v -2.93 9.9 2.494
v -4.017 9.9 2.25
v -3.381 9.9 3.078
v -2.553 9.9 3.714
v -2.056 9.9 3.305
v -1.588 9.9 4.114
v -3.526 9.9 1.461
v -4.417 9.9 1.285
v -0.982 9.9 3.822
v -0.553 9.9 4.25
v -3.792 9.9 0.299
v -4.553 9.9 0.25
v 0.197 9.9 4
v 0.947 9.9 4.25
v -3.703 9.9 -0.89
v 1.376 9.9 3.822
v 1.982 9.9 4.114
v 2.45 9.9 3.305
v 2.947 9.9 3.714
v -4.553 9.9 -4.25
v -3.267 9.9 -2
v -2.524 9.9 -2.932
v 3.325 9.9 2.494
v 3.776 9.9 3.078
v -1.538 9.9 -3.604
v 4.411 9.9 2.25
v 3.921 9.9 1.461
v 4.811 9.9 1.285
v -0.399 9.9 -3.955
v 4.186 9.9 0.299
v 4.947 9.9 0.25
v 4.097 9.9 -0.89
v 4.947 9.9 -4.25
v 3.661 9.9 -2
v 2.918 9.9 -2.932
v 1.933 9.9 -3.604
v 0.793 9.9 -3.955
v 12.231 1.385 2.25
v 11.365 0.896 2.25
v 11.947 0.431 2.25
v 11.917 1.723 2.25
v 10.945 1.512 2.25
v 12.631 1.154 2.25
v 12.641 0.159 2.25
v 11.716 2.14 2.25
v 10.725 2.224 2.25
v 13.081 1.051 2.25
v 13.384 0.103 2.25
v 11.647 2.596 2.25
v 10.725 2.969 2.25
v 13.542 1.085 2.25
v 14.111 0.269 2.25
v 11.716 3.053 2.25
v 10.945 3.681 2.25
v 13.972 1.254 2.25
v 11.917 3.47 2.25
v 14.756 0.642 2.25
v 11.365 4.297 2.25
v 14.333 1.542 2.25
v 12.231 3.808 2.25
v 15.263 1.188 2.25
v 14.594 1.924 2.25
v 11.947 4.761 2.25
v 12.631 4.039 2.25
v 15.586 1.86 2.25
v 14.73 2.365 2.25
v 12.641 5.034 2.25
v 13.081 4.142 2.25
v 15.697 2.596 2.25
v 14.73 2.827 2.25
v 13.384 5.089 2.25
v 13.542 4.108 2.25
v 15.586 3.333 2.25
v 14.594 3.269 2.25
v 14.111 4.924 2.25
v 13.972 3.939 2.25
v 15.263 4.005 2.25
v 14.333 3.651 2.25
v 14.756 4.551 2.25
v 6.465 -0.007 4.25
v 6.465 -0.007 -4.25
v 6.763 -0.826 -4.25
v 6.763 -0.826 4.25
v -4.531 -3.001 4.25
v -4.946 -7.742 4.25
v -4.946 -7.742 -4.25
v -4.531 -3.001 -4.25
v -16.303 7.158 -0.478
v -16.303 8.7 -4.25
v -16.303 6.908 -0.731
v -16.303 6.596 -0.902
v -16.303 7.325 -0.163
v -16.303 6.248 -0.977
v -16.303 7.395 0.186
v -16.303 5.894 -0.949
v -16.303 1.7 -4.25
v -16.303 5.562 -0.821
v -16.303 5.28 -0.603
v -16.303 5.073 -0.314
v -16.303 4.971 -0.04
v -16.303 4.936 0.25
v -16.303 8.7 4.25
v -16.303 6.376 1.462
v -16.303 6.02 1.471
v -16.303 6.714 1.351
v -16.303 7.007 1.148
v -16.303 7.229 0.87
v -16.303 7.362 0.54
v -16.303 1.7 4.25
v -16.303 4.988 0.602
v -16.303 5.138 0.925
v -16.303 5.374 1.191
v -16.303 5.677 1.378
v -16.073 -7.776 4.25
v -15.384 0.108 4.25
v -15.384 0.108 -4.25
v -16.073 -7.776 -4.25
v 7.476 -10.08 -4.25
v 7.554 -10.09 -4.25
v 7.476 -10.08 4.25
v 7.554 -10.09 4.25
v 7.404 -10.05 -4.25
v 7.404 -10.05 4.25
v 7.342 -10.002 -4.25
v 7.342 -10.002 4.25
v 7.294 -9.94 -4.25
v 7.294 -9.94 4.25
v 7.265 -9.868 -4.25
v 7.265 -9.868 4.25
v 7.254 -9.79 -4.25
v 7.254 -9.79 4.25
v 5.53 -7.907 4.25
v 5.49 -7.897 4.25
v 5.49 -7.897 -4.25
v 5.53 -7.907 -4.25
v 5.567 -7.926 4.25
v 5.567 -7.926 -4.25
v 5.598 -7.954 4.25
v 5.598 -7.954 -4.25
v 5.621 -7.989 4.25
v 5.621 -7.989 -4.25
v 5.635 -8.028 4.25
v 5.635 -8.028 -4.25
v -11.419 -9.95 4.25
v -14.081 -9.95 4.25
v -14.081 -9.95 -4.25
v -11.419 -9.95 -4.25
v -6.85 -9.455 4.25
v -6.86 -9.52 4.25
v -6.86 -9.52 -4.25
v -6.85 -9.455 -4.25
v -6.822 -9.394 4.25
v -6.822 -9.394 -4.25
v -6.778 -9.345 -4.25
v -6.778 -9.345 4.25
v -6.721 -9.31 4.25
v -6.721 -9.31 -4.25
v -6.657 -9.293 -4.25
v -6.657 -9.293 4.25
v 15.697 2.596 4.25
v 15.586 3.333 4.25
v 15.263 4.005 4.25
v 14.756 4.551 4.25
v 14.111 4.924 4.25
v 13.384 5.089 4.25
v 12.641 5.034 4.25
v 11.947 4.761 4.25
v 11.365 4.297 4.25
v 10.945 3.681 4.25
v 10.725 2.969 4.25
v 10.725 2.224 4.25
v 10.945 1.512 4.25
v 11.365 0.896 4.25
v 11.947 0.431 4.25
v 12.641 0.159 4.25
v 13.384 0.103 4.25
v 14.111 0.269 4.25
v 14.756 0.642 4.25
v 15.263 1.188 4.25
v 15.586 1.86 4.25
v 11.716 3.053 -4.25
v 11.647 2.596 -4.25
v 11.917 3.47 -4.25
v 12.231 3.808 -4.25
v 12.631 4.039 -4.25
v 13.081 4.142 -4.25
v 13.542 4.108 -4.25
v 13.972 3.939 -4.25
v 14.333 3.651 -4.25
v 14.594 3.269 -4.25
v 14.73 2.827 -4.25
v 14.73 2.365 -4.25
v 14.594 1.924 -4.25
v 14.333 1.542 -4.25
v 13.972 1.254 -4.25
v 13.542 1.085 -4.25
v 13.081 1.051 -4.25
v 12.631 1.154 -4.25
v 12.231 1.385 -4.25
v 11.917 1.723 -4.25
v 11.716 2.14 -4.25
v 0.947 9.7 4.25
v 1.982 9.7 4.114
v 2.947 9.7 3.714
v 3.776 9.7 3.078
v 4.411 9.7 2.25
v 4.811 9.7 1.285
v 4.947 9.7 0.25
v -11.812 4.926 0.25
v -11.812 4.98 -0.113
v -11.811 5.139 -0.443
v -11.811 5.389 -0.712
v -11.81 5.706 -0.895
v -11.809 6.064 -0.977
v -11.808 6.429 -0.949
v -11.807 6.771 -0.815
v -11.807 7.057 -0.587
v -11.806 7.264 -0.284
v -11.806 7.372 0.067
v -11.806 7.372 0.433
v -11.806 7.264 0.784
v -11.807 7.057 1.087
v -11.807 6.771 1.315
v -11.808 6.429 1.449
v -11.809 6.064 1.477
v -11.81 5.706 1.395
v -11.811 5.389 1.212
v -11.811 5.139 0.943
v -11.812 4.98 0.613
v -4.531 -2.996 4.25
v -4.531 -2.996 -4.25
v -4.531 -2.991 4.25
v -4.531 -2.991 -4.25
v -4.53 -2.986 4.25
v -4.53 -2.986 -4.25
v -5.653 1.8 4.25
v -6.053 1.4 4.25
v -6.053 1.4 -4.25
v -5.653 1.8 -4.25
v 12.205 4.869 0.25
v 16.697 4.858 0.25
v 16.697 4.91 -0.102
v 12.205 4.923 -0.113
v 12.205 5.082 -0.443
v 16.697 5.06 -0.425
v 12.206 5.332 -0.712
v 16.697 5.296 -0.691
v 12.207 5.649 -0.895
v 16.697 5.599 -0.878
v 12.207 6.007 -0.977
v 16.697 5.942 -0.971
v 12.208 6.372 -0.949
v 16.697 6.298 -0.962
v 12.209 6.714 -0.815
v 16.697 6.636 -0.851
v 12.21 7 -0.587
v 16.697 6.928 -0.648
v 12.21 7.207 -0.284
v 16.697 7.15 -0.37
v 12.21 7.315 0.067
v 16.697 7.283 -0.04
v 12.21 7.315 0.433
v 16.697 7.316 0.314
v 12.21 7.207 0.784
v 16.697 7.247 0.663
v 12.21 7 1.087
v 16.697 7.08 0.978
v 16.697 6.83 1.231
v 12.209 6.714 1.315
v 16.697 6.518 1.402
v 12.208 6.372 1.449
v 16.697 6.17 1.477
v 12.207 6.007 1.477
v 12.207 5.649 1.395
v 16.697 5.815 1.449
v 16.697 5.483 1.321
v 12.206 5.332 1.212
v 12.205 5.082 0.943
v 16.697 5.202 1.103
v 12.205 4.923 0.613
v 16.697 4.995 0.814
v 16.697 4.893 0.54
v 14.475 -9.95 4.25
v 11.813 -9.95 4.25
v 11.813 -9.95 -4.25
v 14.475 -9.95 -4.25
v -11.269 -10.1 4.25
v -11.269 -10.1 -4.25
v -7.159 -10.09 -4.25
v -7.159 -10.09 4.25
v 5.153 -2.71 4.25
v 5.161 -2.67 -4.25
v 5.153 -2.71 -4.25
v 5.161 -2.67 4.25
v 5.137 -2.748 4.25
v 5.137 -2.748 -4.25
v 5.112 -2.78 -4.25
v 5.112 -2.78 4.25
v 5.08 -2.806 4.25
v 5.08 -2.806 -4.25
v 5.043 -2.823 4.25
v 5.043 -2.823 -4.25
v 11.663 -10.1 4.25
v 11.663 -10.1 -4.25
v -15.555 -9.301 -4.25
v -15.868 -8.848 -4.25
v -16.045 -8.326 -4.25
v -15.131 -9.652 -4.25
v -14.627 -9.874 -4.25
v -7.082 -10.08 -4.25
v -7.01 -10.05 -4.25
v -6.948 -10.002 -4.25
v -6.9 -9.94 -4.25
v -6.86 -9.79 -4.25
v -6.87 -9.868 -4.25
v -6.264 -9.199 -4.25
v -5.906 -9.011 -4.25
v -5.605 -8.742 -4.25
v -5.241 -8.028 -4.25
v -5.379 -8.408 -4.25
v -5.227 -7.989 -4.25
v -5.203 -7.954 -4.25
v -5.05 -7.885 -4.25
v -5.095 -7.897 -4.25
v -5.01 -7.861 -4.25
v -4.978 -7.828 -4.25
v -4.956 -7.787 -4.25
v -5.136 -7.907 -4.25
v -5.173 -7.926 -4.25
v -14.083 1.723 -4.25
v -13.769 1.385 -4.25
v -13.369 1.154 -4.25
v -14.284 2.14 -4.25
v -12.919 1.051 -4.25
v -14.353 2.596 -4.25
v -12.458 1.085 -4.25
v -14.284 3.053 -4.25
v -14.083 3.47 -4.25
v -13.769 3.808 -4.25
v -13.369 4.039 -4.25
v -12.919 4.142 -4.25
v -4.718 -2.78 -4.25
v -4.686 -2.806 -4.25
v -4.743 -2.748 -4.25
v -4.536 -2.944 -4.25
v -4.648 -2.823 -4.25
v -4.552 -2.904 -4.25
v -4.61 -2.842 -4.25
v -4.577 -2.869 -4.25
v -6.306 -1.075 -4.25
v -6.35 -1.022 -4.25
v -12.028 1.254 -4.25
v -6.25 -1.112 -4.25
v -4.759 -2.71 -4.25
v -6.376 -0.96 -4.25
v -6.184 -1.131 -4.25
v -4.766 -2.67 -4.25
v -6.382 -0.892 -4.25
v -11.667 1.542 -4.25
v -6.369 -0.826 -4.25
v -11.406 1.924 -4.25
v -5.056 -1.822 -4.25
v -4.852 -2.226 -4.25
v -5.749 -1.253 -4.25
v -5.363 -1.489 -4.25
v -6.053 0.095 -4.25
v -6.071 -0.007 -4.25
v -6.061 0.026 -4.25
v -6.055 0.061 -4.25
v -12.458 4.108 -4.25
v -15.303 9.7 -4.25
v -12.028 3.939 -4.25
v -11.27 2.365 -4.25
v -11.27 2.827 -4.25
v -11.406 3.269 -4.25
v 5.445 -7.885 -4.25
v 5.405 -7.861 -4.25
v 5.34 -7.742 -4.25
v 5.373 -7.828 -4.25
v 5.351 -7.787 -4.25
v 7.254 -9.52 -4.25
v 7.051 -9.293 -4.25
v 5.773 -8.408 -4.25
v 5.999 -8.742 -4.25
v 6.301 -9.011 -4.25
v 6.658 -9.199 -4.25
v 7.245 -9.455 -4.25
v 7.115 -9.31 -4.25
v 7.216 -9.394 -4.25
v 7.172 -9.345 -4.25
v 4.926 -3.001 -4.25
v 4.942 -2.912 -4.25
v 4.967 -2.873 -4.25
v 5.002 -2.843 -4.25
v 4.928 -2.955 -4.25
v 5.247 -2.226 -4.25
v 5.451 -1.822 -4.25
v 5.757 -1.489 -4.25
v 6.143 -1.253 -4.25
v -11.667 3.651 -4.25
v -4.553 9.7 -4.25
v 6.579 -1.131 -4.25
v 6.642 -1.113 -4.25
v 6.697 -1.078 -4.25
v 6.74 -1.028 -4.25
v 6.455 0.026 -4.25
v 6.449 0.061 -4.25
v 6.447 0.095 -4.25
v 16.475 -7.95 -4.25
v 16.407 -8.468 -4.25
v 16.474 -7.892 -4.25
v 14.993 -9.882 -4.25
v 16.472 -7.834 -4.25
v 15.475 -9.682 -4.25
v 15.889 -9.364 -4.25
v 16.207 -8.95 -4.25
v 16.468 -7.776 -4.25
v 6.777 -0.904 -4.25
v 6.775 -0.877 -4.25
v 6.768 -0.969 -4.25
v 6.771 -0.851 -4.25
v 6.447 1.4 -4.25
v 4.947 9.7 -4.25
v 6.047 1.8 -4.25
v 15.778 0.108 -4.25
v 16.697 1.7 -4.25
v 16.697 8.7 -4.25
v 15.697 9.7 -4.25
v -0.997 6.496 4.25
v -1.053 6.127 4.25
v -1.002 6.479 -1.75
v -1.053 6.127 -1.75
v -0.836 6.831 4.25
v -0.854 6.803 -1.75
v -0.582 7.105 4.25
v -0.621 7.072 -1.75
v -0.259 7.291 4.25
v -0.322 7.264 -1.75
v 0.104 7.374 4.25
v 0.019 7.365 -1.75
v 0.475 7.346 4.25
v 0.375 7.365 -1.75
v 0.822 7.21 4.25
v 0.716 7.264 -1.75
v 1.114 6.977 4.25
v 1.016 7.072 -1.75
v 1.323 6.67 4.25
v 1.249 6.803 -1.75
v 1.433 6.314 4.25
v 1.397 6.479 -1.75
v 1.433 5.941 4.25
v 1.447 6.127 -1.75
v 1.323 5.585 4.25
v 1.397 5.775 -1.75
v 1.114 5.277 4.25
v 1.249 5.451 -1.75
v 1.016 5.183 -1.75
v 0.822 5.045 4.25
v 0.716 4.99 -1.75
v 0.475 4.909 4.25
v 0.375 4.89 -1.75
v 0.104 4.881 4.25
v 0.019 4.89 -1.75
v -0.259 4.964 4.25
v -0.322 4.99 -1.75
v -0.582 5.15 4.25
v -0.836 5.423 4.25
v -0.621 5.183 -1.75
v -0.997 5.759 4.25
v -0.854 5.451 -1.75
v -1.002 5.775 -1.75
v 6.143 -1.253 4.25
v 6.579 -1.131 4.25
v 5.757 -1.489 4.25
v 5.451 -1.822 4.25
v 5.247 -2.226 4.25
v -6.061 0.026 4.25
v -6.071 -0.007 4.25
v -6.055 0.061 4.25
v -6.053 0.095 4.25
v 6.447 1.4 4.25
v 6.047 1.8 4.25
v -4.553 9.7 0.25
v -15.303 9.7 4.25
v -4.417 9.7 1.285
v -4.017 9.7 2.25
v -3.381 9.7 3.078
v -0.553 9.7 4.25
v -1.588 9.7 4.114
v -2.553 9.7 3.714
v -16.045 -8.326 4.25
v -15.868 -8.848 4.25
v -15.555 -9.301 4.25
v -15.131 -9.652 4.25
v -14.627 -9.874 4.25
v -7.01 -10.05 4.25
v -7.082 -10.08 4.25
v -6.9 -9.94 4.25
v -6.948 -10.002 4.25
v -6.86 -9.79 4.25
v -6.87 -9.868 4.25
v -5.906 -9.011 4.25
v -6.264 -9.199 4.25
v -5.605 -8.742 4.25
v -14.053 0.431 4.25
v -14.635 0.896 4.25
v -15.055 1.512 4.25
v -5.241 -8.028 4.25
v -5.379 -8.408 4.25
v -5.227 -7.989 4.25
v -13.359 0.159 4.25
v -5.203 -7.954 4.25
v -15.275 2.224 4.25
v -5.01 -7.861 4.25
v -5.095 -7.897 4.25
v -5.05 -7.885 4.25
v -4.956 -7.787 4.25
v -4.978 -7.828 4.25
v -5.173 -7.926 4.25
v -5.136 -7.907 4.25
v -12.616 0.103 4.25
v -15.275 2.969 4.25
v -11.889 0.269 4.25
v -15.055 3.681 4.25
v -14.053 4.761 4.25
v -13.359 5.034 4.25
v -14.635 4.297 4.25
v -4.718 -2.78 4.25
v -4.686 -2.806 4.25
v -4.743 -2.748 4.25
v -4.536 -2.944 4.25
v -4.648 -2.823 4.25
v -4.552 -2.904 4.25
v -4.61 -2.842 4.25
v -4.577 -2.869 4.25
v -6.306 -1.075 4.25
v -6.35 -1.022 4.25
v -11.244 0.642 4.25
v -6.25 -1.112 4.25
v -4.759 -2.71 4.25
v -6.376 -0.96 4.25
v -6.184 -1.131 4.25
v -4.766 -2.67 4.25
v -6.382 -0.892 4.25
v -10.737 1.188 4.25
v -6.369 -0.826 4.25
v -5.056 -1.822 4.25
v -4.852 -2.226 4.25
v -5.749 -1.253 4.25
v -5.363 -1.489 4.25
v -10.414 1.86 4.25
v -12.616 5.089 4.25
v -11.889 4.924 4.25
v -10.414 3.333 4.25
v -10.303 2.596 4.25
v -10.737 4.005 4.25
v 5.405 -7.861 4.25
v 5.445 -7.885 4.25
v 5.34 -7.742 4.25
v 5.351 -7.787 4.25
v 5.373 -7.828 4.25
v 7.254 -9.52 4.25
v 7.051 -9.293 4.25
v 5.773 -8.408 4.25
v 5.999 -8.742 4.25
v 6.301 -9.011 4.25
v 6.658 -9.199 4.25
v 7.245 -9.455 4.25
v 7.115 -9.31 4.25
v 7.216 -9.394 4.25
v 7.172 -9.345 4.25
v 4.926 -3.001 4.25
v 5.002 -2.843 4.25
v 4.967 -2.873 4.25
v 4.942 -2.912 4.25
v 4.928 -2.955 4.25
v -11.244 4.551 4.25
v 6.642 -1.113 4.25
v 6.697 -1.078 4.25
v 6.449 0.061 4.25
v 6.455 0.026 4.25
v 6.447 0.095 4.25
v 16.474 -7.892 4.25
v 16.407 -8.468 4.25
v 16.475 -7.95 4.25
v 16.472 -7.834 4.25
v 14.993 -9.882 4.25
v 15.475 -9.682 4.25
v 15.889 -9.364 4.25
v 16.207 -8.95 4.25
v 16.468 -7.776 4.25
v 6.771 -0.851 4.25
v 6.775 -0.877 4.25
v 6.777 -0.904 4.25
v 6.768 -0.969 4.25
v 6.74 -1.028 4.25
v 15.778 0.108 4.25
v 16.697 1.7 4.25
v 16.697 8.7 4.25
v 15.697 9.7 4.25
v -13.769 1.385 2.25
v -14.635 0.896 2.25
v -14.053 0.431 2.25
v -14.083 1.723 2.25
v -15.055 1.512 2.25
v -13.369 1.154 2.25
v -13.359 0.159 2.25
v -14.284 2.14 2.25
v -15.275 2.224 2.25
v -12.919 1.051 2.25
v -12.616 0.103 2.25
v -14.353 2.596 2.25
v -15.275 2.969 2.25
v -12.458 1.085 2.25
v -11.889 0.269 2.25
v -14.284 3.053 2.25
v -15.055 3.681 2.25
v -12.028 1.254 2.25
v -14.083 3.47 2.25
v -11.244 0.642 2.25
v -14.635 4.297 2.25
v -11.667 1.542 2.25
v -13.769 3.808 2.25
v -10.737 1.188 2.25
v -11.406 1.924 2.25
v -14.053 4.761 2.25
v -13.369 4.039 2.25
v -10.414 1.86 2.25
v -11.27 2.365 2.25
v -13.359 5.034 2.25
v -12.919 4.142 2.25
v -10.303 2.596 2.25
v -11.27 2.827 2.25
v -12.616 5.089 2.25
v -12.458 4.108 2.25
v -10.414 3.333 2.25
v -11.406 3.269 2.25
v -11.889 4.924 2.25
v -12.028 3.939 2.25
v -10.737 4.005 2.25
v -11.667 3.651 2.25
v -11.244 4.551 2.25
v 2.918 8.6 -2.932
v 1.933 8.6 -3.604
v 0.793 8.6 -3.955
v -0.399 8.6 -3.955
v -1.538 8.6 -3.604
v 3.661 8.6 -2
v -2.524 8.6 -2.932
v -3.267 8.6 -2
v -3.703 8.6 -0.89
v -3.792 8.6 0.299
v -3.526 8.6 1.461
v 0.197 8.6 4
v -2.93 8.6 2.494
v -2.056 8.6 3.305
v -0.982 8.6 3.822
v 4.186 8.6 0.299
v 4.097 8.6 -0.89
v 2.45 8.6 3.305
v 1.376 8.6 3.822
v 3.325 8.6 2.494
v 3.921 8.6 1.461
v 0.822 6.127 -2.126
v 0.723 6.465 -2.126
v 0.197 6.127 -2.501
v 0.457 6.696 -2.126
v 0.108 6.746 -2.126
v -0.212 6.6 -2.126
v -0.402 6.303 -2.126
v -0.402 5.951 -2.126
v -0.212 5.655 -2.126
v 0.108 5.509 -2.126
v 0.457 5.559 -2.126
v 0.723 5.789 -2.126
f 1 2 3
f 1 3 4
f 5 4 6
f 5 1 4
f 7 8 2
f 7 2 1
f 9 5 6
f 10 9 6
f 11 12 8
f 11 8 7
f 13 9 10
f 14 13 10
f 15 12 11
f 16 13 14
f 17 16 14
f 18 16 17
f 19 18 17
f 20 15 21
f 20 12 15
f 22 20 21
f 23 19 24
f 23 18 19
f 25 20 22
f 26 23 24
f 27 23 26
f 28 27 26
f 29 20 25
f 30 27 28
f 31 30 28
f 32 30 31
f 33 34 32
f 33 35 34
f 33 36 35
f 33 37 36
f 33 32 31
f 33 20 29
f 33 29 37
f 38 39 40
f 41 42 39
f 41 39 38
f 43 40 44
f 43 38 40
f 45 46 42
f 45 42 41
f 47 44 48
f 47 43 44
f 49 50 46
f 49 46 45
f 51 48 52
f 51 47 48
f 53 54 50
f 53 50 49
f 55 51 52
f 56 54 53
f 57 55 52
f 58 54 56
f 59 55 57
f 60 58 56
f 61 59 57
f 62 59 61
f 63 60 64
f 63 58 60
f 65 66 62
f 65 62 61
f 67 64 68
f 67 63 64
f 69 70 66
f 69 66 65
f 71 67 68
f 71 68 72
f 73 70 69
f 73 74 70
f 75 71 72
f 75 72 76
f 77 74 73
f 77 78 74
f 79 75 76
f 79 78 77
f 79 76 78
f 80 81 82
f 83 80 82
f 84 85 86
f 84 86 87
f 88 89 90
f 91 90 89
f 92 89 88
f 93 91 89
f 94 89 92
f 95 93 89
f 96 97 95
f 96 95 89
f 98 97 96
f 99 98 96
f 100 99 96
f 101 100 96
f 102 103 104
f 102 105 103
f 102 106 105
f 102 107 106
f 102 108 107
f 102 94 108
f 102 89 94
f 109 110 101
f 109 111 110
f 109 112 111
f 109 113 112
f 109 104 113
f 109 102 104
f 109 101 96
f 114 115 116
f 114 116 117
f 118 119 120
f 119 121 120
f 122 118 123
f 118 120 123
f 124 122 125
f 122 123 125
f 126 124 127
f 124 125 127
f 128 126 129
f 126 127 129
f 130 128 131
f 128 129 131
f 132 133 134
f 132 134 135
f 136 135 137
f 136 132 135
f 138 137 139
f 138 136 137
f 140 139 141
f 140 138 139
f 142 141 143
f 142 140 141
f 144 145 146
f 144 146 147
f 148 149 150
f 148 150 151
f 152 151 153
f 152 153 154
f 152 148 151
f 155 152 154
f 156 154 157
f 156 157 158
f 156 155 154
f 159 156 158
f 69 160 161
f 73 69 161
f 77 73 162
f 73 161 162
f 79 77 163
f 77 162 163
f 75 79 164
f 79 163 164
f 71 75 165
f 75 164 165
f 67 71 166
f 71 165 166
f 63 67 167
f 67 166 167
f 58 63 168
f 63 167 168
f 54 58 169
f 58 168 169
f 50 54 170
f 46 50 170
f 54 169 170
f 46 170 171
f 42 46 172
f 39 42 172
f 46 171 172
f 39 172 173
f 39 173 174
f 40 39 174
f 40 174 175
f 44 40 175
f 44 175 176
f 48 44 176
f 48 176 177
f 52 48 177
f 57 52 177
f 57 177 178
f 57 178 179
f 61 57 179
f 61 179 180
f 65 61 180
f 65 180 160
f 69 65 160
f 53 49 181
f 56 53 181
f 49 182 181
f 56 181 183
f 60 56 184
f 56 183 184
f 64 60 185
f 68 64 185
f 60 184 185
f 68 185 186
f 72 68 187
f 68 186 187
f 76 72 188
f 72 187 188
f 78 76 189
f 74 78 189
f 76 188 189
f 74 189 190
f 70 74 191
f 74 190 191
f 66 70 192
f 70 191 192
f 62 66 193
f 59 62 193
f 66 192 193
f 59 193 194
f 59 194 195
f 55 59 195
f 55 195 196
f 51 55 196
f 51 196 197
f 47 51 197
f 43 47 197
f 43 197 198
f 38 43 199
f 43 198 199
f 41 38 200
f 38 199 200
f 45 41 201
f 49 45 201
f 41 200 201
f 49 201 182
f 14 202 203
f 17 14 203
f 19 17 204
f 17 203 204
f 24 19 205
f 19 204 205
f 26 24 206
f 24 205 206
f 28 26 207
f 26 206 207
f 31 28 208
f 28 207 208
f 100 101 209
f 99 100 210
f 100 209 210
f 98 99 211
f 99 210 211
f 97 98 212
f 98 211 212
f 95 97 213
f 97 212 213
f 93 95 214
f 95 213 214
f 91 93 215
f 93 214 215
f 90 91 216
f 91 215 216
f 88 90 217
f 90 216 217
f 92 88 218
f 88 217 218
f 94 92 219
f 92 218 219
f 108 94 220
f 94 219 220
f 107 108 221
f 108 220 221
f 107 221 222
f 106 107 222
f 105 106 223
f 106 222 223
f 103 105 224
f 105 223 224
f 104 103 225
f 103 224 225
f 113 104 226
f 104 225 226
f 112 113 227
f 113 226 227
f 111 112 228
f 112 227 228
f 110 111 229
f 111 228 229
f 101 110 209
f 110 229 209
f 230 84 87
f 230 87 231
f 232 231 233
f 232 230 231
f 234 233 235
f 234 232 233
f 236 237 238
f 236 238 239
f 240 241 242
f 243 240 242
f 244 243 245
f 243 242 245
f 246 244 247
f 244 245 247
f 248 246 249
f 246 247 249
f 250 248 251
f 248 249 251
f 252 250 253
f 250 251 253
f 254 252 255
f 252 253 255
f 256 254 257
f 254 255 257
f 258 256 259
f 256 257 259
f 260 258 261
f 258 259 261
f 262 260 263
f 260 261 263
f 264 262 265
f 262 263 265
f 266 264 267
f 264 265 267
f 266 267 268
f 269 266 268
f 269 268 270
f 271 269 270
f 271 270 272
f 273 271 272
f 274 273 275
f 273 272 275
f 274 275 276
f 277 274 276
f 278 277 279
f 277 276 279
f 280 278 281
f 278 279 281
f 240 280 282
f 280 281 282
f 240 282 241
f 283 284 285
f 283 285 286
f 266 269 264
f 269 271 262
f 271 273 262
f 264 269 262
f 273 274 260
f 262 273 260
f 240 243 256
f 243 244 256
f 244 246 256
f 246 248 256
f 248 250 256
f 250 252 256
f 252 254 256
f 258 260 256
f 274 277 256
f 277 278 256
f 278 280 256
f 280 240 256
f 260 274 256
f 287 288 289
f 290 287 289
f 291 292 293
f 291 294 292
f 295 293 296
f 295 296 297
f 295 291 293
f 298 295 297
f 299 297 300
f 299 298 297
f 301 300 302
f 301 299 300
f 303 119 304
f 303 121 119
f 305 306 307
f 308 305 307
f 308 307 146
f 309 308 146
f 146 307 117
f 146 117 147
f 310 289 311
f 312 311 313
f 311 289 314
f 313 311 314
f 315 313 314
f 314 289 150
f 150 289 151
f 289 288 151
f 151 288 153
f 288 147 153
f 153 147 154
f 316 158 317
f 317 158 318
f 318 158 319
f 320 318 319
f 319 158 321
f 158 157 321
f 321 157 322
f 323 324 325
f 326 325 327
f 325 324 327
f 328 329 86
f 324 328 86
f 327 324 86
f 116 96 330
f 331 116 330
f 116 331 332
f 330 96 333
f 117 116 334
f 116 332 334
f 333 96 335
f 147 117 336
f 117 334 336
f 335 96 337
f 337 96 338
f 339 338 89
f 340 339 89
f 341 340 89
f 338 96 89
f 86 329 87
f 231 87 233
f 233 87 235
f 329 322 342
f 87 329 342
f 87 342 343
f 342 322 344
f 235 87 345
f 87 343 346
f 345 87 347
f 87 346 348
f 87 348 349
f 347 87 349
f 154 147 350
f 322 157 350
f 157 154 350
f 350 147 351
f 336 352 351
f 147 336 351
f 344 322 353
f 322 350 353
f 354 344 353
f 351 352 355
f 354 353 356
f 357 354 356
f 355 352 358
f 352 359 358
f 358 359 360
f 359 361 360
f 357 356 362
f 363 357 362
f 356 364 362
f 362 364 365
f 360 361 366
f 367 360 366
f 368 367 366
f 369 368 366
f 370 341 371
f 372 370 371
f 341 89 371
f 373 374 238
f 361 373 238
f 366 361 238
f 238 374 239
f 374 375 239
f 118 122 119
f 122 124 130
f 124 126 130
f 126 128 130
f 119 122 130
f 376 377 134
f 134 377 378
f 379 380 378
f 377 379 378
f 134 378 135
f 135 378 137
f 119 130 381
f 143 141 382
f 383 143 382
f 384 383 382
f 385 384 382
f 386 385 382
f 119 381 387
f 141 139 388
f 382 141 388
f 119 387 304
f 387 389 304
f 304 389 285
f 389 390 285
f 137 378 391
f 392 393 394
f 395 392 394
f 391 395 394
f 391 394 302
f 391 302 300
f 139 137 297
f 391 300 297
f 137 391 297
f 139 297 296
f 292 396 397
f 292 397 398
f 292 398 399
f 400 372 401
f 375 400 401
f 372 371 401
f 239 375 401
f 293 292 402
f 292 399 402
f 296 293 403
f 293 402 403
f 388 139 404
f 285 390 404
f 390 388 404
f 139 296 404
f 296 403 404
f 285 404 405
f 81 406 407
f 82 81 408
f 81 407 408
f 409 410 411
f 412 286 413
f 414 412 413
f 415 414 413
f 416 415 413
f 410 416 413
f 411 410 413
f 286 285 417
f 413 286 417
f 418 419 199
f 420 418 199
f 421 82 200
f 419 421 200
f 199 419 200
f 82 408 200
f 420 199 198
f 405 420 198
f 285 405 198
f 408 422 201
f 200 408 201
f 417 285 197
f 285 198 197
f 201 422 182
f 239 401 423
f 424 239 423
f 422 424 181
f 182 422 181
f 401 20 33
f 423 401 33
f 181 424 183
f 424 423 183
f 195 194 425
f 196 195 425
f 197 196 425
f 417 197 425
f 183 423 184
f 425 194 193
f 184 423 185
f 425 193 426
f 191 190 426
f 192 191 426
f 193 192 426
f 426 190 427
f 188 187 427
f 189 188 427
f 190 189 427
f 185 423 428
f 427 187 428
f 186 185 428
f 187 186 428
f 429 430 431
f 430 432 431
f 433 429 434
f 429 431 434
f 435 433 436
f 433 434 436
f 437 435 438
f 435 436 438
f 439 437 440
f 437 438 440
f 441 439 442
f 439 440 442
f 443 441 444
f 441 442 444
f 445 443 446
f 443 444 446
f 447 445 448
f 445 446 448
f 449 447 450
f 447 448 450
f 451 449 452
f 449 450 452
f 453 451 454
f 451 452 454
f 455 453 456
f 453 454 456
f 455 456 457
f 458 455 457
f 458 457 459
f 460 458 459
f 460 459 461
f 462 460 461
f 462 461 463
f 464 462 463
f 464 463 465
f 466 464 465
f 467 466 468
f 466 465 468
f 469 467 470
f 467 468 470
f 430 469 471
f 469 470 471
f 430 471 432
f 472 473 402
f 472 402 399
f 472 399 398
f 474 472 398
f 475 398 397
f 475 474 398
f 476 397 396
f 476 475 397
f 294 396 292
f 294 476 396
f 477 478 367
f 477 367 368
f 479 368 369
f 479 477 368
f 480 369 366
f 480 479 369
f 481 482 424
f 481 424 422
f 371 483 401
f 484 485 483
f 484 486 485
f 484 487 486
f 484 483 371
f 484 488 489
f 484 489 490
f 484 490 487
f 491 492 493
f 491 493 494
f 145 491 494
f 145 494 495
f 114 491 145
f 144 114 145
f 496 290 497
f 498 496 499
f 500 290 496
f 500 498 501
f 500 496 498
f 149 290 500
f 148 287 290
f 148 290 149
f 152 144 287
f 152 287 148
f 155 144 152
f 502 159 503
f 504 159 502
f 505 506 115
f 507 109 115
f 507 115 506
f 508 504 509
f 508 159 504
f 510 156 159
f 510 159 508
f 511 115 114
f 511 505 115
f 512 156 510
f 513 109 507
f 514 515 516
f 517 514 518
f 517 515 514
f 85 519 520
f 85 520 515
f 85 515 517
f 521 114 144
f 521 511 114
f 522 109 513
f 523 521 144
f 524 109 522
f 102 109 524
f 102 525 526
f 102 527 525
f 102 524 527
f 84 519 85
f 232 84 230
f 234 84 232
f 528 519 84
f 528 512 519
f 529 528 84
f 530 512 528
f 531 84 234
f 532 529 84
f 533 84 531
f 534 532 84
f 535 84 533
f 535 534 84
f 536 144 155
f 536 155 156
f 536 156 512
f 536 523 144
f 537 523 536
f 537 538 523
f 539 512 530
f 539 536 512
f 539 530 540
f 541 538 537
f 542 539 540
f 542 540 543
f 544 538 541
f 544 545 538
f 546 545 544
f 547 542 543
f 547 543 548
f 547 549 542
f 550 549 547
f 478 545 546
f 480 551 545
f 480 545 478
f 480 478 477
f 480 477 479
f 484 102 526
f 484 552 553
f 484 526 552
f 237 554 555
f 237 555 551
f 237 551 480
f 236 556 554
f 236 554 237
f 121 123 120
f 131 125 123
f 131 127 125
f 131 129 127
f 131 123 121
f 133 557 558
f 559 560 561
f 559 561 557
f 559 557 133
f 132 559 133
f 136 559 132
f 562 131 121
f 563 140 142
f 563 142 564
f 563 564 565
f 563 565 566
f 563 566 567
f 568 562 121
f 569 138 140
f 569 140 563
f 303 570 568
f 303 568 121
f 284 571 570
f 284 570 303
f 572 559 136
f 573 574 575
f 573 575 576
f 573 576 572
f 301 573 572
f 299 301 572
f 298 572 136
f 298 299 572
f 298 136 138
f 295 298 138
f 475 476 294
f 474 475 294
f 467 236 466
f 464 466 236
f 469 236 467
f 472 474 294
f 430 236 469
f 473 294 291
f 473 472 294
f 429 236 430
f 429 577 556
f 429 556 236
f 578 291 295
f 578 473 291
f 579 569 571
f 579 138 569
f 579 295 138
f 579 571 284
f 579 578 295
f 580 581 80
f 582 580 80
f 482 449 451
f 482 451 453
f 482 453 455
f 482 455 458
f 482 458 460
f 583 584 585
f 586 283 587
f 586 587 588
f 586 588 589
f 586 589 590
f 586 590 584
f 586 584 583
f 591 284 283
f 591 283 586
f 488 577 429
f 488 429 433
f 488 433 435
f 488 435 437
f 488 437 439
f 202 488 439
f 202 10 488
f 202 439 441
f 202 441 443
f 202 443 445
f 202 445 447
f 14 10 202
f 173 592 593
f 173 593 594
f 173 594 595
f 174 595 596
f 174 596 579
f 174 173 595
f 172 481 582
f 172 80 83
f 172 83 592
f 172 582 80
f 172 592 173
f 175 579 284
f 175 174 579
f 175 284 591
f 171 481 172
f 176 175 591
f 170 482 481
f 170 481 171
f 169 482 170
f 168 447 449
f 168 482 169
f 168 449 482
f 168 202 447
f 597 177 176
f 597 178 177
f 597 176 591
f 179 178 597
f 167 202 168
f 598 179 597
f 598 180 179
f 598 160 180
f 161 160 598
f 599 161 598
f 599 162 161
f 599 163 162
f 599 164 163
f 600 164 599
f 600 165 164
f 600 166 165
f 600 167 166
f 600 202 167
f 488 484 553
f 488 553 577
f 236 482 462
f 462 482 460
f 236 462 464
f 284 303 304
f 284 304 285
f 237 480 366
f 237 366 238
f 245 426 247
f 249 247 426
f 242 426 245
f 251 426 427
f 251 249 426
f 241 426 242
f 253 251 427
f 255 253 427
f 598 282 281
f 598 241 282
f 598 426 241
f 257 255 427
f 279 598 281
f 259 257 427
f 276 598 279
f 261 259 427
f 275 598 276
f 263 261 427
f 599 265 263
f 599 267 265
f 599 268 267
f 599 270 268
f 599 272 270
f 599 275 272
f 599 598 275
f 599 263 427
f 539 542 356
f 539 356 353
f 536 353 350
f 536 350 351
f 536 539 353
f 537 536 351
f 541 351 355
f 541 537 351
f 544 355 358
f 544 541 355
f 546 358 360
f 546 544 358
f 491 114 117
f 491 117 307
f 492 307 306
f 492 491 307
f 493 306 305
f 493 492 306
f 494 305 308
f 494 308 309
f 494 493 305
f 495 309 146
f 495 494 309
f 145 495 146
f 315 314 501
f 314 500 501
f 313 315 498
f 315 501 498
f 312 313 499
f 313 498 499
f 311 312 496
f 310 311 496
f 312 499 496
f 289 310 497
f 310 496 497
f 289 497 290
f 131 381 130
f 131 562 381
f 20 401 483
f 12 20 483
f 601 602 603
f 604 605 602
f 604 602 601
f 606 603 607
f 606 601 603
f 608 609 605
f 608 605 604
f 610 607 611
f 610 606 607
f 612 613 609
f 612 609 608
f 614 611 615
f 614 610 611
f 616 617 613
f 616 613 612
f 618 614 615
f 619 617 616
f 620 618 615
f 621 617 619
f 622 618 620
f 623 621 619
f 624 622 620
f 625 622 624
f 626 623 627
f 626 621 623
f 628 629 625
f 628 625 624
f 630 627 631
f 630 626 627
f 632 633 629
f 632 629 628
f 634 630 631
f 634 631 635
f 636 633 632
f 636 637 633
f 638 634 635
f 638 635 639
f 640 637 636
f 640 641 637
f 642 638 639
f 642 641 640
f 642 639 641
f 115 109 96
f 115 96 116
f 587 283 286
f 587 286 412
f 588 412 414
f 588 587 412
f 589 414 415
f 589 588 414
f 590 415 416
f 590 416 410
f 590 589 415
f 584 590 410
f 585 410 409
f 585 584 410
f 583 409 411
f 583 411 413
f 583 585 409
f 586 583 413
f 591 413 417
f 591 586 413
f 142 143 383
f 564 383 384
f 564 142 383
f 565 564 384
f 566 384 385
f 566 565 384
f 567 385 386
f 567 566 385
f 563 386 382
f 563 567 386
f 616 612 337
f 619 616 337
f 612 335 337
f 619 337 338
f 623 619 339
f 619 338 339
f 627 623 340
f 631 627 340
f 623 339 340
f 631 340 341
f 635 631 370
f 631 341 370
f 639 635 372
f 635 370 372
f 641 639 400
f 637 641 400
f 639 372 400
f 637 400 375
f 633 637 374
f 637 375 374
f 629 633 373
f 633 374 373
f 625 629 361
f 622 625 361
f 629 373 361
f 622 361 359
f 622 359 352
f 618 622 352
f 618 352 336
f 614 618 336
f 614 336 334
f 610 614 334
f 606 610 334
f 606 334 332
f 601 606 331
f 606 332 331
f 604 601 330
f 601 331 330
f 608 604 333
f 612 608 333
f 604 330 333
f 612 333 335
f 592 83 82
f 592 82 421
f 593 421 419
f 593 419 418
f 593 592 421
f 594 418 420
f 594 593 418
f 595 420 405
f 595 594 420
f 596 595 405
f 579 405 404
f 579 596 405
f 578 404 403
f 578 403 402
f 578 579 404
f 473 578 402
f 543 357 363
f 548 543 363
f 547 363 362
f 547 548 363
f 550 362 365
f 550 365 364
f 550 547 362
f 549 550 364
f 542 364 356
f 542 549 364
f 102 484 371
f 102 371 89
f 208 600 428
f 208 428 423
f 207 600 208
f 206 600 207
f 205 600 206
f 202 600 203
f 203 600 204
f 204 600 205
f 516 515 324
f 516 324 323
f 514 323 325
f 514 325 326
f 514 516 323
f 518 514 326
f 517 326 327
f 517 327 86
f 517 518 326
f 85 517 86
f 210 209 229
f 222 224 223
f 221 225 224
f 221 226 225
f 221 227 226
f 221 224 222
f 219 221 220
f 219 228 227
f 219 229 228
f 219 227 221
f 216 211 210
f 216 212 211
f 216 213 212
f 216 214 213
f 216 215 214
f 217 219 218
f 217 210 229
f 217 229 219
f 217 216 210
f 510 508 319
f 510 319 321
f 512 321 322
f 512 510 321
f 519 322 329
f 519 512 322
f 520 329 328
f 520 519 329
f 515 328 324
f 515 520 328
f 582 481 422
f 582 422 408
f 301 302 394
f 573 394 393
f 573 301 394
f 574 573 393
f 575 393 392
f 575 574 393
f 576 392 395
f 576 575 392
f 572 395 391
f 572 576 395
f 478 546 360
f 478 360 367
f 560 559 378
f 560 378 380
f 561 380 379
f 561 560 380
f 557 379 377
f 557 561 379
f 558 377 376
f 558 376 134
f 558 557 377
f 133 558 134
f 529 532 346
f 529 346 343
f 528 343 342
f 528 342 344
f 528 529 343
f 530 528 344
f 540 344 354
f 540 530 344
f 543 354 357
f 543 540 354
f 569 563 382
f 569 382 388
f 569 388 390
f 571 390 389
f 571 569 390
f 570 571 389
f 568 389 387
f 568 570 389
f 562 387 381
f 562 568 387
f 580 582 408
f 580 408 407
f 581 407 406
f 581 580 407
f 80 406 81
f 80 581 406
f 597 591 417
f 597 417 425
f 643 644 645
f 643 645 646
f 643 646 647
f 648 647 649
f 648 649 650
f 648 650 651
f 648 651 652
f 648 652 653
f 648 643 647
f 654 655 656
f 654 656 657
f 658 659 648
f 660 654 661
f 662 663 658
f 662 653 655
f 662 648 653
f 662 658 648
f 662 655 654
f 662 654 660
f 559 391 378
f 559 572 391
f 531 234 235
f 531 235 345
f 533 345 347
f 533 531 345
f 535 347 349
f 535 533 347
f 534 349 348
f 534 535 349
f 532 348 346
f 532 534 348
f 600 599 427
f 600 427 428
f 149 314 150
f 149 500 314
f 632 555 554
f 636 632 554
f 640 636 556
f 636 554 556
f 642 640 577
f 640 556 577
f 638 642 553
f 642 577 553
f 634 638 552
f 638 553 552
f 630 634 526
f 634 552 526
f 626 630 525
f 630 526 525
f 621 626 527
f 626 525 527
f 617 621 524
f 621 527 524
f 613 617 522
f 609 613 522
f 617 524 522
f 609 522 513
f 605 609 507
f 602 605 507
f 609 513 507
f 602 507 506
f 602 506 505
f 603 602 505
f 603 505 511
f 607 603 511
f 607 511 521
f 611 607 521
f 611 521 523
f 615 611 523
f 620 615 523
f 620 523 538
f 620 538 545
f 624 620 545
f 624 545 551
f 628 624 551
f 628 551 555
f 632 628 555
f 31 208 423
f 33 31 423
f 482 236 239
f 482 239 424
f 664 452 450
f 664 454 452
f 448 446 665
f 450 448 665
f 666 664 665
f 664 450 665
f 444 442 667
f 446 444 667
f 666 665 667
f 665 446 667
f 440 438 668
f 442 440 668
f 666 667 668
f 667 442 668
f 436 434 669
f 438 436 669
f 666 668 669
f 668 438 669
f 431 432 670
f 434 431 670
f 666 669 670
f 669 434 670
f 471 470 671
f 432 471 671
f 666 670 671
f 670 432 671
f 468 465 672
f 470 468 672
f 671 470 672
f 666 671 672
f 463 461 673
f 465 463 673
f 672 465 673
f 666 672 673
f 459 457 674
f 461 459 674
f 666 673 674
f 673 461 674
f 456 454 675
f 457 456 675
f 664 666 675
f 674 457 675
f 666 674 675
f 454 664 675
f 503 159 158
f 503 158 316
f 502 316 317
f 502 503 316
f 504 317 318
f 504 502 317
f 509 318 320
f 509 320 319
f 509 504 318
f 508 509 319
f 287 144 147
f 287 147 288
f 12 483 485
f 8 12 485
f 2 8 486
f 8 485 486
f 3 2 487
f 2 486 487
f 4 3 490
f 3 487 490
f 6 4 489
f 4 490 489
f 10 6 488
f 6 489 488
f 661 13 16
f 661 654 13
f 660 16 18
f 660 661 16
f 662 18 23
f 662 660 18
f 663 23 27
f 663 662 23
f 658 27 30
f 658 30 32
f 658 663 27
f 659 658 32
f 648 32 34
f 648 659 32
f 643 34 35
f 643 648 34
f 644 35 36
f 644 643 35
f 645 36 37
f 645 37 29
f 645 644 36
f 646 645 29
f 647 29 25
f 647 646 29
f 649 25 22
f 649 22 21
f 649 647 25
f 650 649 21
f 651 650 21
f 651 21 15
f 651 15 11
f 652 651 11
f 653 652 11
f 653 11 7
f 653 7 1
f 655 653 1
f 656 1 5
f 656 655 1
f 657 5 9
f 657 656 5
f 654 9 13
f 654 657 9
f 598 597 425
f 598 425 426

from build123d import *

# Parameters (mm, degrees)
EXTRUDE1_DEPTH                          = 4.25
CBORE_FOR_M5_HEX_HEAD_BOLT2_D           = 3.1
CBORE_FOR_M5_HEX_HEAD_BOLT2_CBORE_D     = 5
CBORE_FOR_M5_HEX_HEAD_BOLT2_CBORE_DEPTH = 2
F_2_5_2_5_DIAMETER_HOLE1_D              = 2.5
F_2_5_2_5_DIAMETER_HOLE1_DEPTH          = 6
F_2_5_2_5_DIAMETER_HOLE1_TIP            = 0.751075774
SKETCH13_R                              = 4
EXTRUDE3_DEPTH                          = 0.2
CUT_EXTRUDE2_START                      = -1.3
SKETCH15_R                              = 4
CUT_EXTRUDE2_DEPTH                      = 1.3
FILLET1_R                               = 0.3
SKETCH16_W                              = 4.5
SKETCH16_H                              = 1.23


with BuildPart() as part:
    # Sketch1 → Extrude1 (new, symmetric)
    with BuildSketch(Plane.XY):
        with BuildLine():
            Line((4.92550995, -3.000896773), (5.340282634, -7.741770244))
            ThreePointArc((5.340282634, -7.741770244), (5.387571197, -7.845597639), (5.489639003, -7.896573115))
            ThreePointArc((5.489639003, -7.896573115), (5.583252131, -7.939368417), (5.635340188, -8.028147299))
            ThreePointArc((5.635340188, -8.028147299), (6.141739158, -8.88598399), (7.051010463, -9.292861611))
            ThreePointArc((7.051010463, -9.292861611), (7.196097182, -9.367838396), (7.25433228, -9.520417385))
            Line((7.25433228, -9.520417385), (7.25433228, -10.089549749))
            Line((7.25433228, -10.089549749), (11.66333313, -10.10000765))
            Line((11.66333313, -10.10000765), (11.81333313, -9.95000765))
            Line((11.81333313, -9.95000765), (14.47525163, -9.95000765))
            ThreePointArc((14.47525163, -9.95000765), (15.889465188, -9.36422121), (16.475251623, -7.95000765))
            ThreePointArc((16.475251623, -7.95000765), (16.473348066, -7.862768875), (16.467641019, -7.775696164))
            Line((16.467641019, -7.775696164), (15.777924964, 0.107794413))
            Line((15.777924964, 0.107794413), (16.697189707, 1.700007653))
            Line((16.697189707, 1.700007653), (16.697189707, 8.700007649))
            Line((16.697189707, 8.700007649), (15.697189707, 9.70000765))
            Line((15.697189707, 9.70000765), (-15.302810298, 9.70000765))
            Line((-15.302810298, 9.70000765), (-16.302810293, 8.700007655))
            Line((-16.302810293, 8.700007655), (-16.302810293, 1.70000765))
            Line((-16.302810293, 1.70000765), (-15.383545551, 0.107794412))
            Line((-15.383545551, 0.107794412), (-16.073261605, -7.775696165))
            ThreePointArc((-16.073261605, -7.775696165), (-15.555426882, -9.301188065), (-14.080872208, -9.95000765))
            Line((-14.080872208, -9.95000765), (-11.418953708, -9.95000765))
            Line((-11.418953708, -9.95000765), (-11.268953705, -10.10000765))
            Line((-11.268953705, -10.10000765), (-6.85995286, -10.089549753))
            Line((-6.85995286, -10.089549753), (-6.85995286, -9.520417385))
            ThreePointArc((-6.85995286, -9.520417385), (-6.801717763, -9.367838396), (-6.656631044, -9.292861611))
            ThreePointArc((-6.656631044, -9.292861611), (-5.747359739, -8.885983989), (-5.240960769, -8.028147299))
            ThreePointArc((-5.240960769, -8.028147299), (-5.188872711, -7.939368417), (-5.095259583, -7.896573115))
            ThreePointArc((-5.095259583, -7.896573115), (-4.993191778, -7.845597639), (-4.945903214, -7.741770244))
            Line((-4.945903214, -7.741770244), (-4.531130531, -3.000896773))
            ThreePointArc((-4.531130531, -3.000896773), (-4.530642578, -2.993452056), (-4.530479824, -2.985993141))
            ThreePointArc((-4.530479824, -2.985993141), (-4.563077813, -2.885564642), (-4.648443372, -2.823425817))
            ThreePointArc((-4.648443372, -2.823425817), (-4.731098063, -2.76492056), (-4.766166593, -2.669921291))
            ThreePointArc((-4.766166593, -2.669921291), (-5.198040021, -1.644927498), (-6.18433448, -1.130777545))
            ThreePointArc((-6.18433448, -1.130777545), (-6.349566009, -1.022272522), (-6.368749921, -0.825532146))
            Line((-6.368749921, -0.825532146), (-6.070902174, -0.007202189))
            ThreePointArc((-6.070902174, -0.007202189), (-6.057367635, 0.043309401), (-6.05280996, 0.095403855))
            Line((-6.05280996, 0.095403855), (-6.05280996, 1.399955293))
            Line((-6.05280996, 1.399955293), (-5.652810289, 1.800007648))
            Line((-5.652810289, 1.800007648), (6.047189708, 1.800007648))
            Line((6.047189708, 1.800007648), (6.44718938, 1.399955292))
            Line((6.44718938, 1.399955292), (6.44718938, 0.095403855))
            ThreePointArc((6.44718938, 0.095403855), (6.451747054, 0.043309401), (6.465281594, -0.007202188))
            Line((6.465281594, -0.007202188), (6.763129341, -0.825532146))
            ThreePointArc((6.763129341, -0.825532146), (6.773460706, -0.864089327), (6.77693973, -0.903854759))
            ThreePointArc((6.77693973, -0.903854759), (6.720404632, -1.054509523), (6.578713899, -1.130777545))
            ThreePointArc((6.578713899, -1.130777545), (5.59241944, -1.644927498), (5.160546013, -2.669921291))
            ThreePointArc((5.160546013, -2.669921291), (5.125477483, -2.76492056), (5.042822792, -2.823425817))
            ThreePointArc((5.042822792, -2.823425817), (4.953208331, -2.891697239), (4.92550995, -3.000896773))
        make_face()
    extrude(amount=EXTRUDE1_DEPTH, both=True)

    # CBORE for M5 Hex Head Bolt2 (through all)
    with Locations(Plane(origin=(-12.802810293, 2.596389855, 4.25), x_dir=(1, 0, 0), z_dir=(0, 0, 1))):
        with Locations((0, 0), (26, 0)):
            CounterBoreHole(CBORE_FOR_M5_HEX_HEAD_BOLT2_D / 2, CBORE_FOR_M5_HEX_HEAD_BOLT2_CBORE_D / 2, CBORE_FOR_M5_HEX_HEAD_BOLT2_CBORE_DEPTH)

    # Ø2.5 (2.5) Diameter Hole1
    with Locations(Plane(origin=(0.197189707, 6.127234967, 4.25), x_dir=(1, 0, 0), z_dir=(0, 0, 1))):
        with Locations((0, 0)):
            Hole(F_2_5_2_5_DIAMETER_HOLE1_D / 2, depth=F_2_5_2_5_DIAMETER_HOLE1_DEPTH)
            with Locations((0, 0, -(F_2_5_2_5_DIAMETER_HOLE1_DEPTH + F_2_5_2_5_DIAMETER_HOLE1_TIP / 2))):  # 118° drill point
                Cone(0, F_2_5_2_5_DIAMETER_HOLE1_D / 2, F_2_5_2_5_DIAMETER_HOLE1_TIP, mode=Mode.SUBTRACT)

    # Sketch13 → Extrude3 (add)
    with BuildSketch(Plane(origin=(0, 9.70000765, 0), x_dir=(1, 0, 0), z_dir=(0, 1, 0))):
        with BuildLine():
            Line((-4.552810293, 4.25), (-4.552810293, -0.25))
            ThreePointArc((-4.552810293, -0.25), (-3.381237418, -3.078427125), (-0.552810293, -4.25))
            Line((-0.552810293, -4.25), (0.947189707, -4.25))
            ThreePointArc((0.947189707, -4.25), (3.775616832, -3.078427125), (4.947189707, -0.25))
            Line((4.947189707, -0.25), (4.947189707, 4.25))
            Line((4.947189707, 4.25), (-4.552810293, 4.25))
        make_face()
        with Locations(Location((0.197189707, 0, 0), (0, 0, 270))):
            Circle(SKETCH13_R, mode=Mode.SUBTRACT)
    extrude(amount=EXTRUDE3_DEPTH)

    # Sketch15 → Cut-Extrude2 (cut)
    with BuildSketch(Plane(origin=(0, 9.90000765, 0), x_dir=(1, 0, 0), z_dir=(0, 1, 0)).offset(CUT_EXTRUDE2_START)):
        with Locations(Location((0.197189707, 0, 0), (0, 0, 270))):
            Circle(SKETCH15_R)
    extrude(amount=CUT_EXTRUDE2_DEPTH, mode=Mode.SUBTRACT)

    # Fillet1
    fillet1_edges = [part.edges().sort_by_distance(p)[0] for p in [
        (-6.85995286, -10.089549753, 0),
        (7.25433228, -10.089549749, 0),
    ]]
    fillet(fillet1_edges, radius=FILLET1_R)

    # Sketch16 → Cut-Revolve1 (revolve, cut)
    with BuildSketch(Plane(origin=(0.014534484, 6.127668215, 0), x_dir=(0.9999971869535607, -0.0023719369649562337, 0), z_dir=(-0.0023719369649562337, -0.9999971869535607, 0)), mode=Mode.PRIVATE) as cut_revolve1_sk:
        with Locations((14.443110426, 0.865)):
            Rectangle(SKETCH16_W, SKETCH16_H)
        with Locations((-14.073400302, 0.865)):
            Rectangle(SKETCH16_W, SKETCH16_H)
    revolve(cut_revolve1_sk.sketch.rotate(Axis((-24.587443164, 6.186022719, 0.25), (0.9999971869535605, -0.002371936964956225, 0)), 90), axis=Axis((-24.587443164, 6.186022719, 0.25), (0.9999971869535605, -0.002371936964956225, 0)), mode=Mode.SUBTRACT)


solid = part.part
